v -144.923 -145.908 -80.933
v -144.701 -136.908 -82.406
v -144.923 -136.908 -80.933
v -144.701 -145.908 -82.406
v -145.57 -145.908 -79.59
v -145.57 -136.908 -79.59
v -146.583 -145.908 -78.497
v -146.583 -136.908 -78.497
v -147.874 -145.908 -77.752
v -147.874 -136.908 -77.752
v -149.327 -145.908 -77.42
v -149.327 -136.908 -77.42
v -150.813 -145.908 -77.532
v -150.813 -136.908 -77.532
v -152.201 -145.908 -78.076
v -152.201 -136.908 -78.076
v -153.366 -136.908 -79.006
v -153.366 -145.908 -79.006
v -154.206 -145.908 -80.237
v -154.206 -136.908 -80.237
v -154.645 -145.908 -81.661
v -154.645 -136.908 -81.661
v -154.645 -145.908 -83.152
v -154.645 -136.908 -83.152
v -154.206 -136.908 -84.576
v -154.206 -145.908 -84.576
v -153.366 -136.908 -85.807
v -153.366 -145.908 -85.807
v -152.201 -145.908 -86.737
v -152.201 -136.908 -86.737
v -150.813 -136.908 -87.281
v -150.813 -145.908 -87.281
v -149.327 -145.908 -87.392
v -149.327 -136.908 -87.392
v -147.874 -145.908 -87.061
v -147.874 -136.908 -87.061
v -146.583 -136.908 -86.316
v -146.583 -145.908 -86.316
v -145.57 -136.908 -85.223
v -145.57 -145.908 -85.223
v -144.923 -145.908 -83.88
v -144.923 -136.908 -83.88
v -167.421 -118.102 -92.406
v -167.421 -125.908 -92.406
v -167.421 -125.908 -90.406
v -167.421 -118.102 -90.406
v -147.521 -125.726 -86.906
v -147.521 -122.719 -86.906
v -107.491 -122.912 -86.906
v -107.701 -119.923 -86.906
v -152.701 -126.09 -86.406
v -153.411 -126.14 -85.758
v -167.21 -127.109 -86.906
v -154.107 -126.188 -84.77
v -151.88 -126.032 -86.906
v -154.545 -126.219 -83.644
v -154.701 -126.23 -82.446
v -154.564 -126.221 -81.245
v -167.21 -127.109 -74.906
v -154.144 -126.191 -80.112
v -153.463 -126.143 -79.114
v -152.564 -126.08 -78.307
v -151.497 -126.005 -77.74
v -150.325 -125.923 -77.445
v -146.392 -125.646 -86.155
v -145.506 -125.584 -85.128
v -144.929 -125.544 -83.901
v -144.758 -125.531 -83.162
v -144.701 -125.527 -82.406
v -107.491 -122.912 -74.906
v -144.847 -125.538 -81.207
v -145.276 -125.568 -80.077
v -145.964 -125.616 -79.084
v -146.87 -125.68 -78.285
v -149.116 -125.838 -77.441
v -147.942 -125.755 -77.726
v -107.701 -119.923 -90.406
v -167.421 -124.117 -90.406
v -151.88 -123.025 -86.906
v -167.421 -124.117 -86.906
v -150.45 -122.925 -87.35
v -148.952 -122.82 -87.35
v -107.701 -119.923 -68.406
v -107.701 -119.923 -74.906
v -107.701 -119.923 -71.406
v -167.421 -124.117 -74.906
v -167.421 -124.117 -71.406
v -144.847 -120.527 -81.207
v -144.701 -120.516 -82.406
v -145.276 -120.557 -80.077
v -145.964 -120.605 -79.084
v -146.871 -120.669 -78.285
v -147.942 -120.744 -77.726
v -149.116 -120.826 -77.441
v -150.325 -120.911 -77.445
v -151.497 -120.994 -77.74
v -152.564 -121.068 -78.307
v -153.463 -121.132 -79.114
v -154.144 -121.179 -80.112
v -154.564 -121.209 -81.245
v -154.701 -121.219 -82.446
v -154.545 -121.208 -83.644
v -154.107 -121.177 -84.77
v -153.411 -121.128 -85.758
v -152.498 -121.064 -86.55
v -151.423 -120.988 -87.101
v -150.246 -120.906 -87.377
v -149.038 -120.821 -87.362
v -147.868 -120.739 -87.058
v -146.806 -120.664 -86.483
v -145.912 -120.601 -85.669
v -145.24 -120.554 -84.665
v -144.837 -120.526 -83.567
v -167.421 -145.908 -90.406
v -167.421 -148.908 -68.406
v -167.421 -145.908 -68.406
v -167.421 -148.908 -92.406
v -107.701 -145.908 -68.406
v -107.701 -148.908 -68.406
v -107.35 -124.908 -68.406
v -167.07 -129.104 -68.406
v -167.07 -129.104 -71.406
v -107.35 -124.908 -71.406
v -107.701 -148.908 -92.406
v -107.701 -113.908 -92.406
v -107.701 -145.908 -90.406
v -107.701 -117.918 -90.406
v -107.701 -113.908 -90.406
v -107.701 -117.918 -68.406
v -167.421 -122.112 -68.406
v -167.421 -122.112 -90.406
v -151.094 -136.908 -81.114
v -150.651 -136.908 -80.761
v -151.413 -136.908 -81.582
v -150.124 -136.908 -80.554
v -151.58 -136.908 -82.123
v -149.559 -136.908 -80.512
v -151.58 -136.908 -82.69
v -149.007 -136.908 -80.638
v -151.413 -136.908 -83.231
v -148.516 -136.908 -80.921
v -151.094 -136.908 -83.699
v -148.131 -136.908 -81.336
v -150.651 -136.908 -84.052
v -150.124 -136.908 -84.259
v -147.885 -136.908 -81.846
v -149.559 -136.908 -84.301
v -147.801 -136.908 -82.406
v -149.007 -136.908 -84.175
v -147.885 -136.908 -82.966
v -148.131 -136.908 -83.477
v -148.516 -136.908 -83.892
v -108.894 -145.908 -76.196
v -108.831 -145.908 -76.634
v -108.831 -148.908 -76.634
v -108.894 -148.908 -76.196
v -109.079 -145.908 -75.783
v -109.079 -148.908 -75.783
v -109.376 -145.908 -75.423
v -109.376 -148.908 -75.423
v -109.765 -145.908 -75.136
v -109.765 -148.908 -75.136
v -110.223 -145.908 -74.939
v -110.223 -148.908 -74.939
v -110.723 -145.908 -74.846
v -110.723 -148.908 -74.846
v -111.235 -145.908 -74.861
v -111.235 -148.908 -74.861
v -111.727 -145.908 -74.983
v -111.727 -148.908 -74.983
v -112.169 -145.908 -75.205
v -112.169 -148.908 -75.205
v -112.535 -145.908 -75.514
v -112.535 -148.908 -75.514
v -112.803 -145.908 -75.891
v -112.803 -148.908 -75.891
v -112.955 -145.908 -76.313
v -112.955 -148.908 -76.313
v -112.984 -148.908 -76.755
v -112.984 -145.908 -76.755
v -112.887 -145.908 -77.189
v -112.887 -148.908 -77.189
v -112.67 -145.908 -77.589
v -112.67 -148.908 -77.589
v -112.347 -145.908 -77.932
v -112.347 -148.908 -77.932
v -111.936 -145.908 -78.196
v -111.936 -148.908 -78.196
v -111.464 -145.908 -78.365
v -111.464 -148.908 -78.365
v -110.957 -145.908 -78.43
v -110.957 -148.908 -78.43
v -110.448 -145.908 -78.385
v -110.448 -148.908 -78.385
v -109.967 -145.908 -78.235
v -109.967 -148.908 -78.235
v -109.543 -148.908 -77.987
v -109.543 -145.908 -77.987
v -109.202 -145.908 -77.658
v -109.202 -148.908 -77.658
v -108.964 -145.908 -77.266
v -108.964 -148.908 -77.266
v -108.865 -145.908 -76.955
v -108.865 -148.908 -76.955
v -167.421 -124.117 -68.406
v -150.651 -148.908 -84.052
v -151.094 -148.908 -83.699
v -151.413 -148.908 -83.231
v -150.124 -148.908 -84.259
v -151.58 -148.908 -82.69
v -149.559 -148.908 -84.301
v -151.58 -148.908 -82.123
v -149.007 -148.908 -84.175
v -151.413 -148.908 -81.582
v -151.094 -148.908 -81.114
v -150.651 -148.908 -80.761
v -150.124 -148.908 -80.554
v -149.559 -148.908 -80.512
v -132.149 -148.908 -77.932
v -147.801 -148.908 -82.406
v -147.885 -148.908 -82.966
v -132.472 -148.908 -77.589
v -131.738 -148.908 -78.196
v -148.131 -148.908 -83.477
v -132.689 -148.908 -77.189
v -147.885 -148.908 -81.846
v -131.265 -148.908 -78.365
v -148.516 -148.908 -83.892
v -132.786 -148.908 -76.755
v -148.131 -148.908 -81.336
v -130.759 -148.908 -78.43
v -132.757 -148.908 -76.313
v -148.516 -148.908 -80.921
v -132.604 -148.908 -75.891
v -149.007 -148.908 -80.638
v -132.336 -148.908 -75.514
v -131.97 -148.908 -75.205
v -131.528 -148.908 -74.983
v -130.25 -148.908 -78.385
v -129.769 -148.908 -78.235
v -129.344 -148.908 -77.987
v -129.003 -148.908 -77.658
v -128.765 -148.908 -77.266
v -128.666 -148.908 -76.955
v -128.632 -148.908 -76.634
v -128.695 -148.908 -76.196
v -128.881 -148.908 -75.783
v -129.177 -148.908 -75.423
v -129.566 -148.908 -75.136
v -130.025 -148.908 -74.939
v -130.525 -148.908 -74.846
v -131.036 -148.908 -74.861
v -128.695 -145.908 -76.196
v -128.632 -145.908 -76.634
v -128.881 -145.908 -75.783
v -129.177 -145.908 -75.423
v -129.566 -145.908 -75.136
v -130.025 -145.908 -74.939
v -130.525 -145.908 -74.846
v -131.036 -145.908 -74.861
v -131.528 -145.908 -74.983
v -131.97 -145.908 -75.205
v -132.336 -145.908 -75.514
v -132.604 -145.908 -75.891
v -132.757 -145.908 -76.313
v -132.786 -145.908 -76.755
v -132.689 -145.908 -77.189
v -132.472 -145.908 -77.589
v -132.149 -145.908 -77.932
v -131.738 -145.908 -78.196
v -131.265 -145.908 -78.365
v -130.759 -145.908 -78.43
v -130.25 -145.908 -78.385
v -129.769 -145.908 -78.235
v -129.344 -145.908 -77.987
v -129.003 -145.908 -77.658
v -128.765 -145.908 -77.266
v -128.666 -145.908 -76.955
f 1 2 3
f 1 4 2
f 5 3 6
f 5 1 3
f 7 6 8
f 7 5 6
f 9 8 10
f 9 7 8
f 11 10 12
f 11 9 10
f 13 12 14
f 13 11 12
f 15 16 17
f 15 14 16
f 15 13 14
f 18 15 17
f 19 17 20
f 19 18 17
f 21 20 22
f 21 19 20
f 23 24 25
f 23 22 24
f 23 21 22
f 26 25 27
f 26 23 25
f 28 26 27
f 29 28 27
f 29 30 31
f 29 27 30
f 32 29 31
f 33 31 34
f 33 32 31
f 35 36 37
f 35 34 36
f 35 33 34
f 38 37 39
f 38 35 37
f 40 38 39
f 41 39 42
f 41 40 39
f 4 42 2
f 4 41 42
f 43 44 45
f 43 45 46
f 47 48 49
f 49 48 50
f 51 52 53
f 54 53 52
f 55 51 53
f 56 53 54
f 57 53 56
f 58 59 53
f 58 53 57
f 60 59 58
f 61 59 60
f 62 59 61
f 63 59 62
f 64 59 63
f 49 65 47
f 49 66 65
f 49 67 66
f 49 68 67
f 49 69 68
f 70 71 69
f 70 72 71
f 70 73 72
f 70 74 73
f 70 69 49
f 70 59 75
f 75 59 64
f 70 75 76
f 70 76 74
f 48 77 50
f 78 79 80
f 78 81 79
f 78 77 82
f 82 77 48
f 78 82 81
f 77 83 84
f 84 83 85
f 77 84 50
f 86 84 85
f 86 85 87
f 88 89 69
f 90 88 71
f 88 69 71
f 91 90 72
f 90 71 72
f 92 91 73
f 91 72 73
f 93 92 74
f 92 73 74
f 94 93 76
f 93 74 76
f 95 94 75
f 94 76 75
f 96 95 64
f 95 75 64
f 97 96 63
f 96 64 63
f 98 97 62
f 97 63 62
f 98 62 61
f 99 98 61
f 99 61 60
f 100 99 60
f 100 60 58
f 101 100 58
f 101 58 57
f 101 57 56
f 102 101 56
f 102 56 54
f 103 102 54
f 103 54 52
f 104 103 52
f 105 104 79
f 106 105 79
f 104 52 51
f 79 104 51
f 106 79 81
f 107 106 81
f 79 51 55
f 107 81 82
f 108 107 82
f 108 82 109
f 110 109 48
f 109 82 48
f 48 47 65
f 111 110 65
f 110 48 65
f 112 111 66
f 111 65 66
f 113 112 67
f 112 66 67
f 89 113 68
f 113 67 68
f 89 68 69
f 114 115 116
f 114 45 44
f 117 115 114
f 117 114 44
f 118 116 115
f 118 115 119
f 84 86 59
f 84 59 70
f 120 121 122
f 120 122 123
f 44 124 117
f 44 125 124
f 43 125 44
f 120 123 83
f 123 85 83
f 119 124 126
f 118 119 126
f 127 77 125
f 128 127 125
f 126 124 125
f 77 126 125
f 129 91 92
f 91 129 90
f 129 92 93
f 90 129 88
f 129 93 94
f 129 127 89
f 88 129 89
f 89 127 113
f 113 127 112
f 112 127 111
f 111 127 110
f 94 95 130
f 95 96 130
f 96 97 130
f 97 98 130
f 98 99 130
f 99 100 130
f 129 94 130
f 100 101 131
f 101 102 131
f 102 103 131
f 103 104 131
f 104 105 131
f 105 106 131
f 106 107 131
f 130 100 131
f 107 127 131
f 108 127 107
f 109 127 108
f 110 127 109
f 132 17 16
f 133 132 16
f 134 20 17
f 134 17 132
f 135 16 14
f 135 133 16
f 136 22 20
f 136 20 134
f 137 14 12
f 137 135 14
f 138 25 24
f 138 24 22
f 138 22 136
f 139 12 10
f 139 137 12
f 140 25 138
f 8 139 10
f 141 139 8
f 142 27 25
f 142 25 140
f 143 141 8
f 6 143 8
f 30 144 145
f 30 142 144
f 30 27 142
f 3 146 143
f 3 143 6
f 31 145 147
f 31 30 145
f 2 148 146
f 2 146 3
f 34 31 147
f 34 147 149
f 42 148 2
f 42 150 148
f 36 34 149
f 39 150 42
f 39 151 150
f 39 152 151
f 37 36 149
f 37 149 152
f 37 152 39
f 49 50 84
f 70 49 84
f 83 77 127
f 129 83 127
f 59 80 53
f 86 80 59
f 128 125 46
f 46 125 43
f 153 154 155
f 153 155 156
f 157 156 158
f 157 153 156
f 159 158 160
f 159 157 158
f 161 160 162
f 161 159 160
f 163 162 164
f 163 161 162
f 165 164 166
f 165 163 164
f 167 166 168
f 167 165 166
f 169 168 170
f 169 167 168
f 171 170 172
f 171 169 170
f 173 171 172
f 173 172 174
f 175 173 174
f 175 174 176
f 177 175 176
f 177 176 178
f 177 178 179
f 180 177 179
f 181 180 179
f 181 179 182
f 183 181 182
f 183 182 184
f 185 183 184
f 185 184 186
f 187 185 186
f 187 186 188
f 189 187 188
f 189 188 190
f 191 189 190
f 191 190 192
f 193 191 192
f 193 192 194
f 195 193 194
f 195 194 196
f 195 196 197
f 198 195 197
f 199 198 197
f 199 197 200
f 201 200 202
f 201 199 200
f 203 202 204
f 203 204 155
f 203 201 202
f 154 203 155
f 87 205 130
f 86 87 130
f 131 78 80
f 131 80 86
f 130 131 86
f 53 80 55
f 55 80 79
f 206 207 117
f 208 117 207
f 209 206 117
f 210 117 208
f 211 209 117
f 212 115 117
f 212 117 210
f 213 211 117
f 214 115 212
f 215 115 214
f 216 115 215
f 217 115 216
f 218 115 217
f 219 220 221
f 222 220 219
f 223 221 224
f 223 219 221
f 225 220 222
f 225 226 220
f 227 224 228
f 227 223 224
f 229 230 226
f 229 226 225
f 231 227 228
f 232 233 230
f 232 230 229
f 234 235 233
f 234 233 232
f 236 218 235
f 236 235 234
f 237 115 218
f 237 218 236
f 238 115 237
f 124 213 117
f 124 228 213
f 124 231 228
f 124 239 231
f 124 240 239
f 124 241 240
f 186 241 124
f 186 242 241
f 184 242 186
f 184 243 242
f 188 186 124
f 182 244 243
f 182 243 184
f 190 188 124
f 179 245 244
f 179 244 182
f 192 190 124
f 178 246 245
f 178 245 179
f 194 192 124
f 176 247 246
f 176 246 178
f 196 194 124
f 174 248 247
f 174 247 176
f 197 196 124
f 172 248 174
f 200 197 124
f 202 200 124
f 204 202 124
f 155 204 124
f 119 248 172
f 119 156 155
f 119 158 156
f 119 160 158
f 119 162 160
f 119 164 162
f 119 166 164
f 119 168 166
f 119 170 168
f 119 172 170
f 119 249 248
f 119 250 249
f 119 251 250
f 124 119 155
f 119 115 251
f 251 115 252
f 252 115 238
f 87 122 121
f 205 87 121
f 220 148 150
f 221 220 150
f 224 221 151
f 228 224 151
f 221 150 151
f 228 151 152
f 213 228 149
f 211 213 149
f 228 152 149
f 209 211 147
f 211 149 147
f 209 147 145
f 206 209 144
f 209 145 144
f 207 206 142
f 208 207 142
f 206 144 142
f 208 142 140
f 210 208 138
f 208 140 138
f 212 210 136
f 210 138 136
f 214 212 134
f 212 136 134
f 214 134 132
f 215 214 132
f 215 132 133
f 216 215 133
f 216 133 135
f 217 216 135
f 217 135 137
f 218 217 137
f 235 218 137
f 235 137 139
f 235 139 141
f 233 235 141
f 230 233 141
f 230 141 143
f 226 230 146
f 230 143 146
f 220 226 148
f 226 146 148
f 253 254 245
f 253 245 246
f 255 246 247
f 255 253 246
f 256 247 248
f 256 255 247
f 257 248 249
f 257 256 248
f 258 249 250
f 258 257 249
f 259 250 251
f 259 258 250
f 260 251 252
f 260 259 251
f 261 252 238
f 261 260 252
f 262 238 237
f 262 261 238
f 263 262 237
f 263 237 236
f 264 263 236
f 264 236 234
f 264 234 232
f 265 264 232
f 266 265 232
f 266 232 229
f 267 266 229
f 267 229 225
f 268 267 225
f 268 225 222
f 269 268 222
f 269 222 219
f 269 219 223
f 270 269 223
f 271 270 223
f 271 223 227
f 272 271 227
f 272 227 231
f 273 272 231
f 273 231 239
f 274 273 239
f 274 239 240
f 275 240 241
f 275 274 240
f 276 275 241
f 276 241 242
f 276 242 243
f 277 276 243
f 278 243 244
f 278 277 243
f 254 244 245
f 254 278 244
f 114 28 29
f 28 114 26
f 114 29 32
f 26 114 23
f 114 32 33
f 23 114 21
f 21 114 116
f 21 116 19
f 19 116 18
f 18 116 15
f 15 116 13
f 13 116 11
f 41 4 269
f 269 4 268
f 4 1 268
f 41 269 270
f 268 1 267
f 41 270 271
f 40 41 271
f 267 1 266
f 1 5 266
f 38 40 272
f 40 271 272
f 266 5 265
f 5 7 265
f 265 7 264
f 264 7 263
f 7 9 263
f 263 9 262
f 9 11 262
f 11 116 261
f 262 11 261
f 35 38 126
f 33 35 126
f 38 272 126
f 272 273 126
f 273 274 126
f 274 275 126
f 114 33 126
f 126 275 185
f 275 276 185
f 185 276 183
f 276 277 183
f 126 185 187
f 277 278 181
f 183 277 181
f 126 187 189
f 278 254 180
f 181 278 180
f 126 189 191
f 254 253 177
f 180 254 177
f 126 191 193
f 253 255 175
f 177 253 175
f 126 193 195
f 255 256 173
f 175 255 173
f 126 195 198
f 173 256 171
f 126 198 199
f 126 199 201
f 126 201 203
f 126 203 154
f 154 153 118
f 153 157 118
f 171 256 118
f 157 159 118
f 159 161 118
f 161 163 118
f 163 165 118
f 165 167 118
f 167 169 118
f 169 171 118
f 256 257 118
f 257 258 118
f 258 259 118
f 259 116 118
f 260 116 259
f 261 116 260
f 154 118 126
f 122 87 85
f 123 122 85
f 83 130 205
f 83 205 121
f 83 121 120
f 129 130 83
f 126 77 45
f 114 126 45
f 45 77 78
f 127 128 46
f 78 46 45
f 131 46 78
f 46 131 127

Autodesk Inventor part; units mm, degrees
ref_plane "YZ Plane" through (0, 0, 0) normal (1, 0, 0) x (0, 1, 0)
ref_plane "XZ Plane" through (0, 0, 0) normal (0, 1, 0) x (-1, 0, 0)
ref_plane "XY Plane" through (0, 0, 0) normal (0, 0, 1) x (1, 0, 0)
ref_plane "작업 평면1" through (-108.7402, -145.9081, -64.7043) normal (0, -1, 0) x (1, 0, 0)
sketch "스케치1" plane through (-108.7402, -145.9081, -64.7043) normal (0, -1, 0) x (1, 0, 0)
  ellipse E0 centre (-21.9712, -11.93) end of major axis (-19.8923, -11.93) minor radius 1.7957 projected
  ellipse E1 centre (-2.1698, -11.93) end of major axis (-0.091, -11.93) minor radius 1.7957 projected
  line L0 (-25.1804, -13.5798) -> (-25.1804, 0) projected
  ellipse E2 centre (0, 0) end of major axis (1.0394, 0) minor radius 0.8978 (1.0394, 0) -> (0, 0.8978) ccw projected
  line L1 (1.0394, 0) -> (1.0394, -13.5798) projected
  ellipse E3 centre (-0.2599, -13.5798) end of major axis (1.0394, -13.5798) minor radius 1.1223 (-0.2599, -14.7021) -> (1.0394, -13.5798) ccw projected
  line L2 (-0.2599, -14.7021) -> (-23.8811, -14.7021) projected
  ellipse E4 centre (-23.8811, -13.5798) end of major axis (-22.5818, -13.5798) minor radius 1.1223 (-25.1804, -13.5798) -> (-23.8811, -14.7021) ccw projected
  line L3 (-25.1804, -13.5798) -> (-25.1804, 0) projected
  ellipse E5 centre (-24.141, 0) end of major axis (-25.1804, 0) minor radius 0.8978 (-24.141, 0.8978) -> (-25.1804, 0) ccw projected
  line L4 (-24.141, 0.8978) -> (0, 0.8978) projected
  ellipse E6 centre (-21.9712, -11.93) end of major axis (-19.3726, -11.93) minor radius 2.2446 projected
  ellipse E7 centre (-2.1698, -11.93) end of major axis (0.4288, -11.93) minor radius 2.2446 projected
  ellipse E8 centre (-23.6213, -0.5275) end of major axis (-22.4194, -0.5275) minor radius 1.0381 projected
  ellipse E9 centre (-20.3211, -0.5275) end of major axis (-19.1192, -0.5275) minor radius 1.0381 projected
  ellipse E10 centre (-17.0208, -0.5275) end of major axis (-15.819, -0.5275) minor radius 1.0381 projected
  ellipse E11 centre (-13.7206, -0.5275) end of major axis (-12.5188, -0.5275) minor radius 1.0381 projected
  ellipse E12 centre (-10.4204, -0.5275) end of major axis (-9.2185, -0.5275) minor radius 1.0381 projected
  ellipse E13 centre (-7.1202, -0.5275) end of major axis (-5.9183, -0.5275) minor radius 1.0381 projected
  ellipse E14 centre (-3.8199, -0.5275) end of major axis (-2.6181, -0.5275) minor radius 1.0381 projected
  ellipse E15 centre (-0.5197, -0.5275) end of major axis (0.6821, -0.5275) minor radius 1.0381 projected
  line L5 (-25.1804, -3.7021) -> (1.0394, -3.7021)
  line L6 (1.0394, -27.7021) -> (-58.6804, -27.7021)
  line L7 (-58.6804, -27.7021) -> (-58.6804, -3.7021)
  line L8 (-58.6804, -3.7021) -> (1.0394, -3.7021)
  line L9 (1.0394, -3.7021) -> (1.0394, -27.7021)
  point P0 (108.7402, 64.7043)
  point P1 (-25.1804, -3.7021)
  point P2 (-25.1804, -3.7021)
  point P3 (1.0394, -13.5798)
  dimension "d0" = 11
  dimension "d3" = 33.5
  dimension "d4" = 13
extrude "돌출1" add sketch "스케치1" along normal blind 3 contours E4 L2 E3 L9 L6 L7 L8 L0 | L0 L5 L1 E3 L2 E4 | E6 | E7
sketch "스케치2" plane through (-108.7402, -145.9081, -64.7043) normal (0, 1, 0) x (1, 0, 0)
  line L0 (1.0394, 27.7021) -> (1.0394, 3.7021) projected
  line L1 (-58.6804, 27.7021) -> (1.0394, 27.7021) projected
  line L2 (-58.6804, 3.7021) -> (-58.6804, 27.7021) projected
  line L3 (1.0394, 27.7021) -> (-58.6804, 27.7021)
  line L4 (-58.6804, 27.7021) -> (-58.6804, 25.7021)
  line L5 (-58.6804, 25.7021) -> (1.0394, 25.7021)
  line L6 (1.0394, 25.7021) -> (1.0394, 27.7021)
  point P0 (108.7402, -64.7043)
  point P1 (1.0394, 25.7021)
  dimension "d5" = 2
extrude "돌출2" add sketch "스케치2" along normal blind 20
sketch "스케치4" plane through (-107.7008, -148.9081, -92.4064) normal (0, 0, -1) x (-1, 0, 0)
  line L0 (0, 23) -> (59.7199, 23) projected
  line L1 (0, 23) -> (0, 35)
  line L2 (0, 35) -> (42.7199, 35) construction
  line L3 (42.7199, 35) -> (42.7199, 32) construction
  line L4 (0, 35) -> (59.7199, 30.8062)
  line L5 (59.7199, 23) -> (59.7199, 40.663)
  point P0 (-107.7008, 148.9081)
  dimension "d11" = 42.7199
  dimension "d12" = 12
  dimension "d13" = 3
extrude "돌출4" add sketch "스케치4" against normal blind 2
sketch "스케치5" plane through (-108.7402, -145.9081, -64.7043) normal (0, 1, 0) x (1, 0, 0)
  line L0 (1.0394, 3.7021) -> (-58.6804, 3.7021) projected
  line L1 (1.0394, 25.7021) -> (1.0394, 3.7021) projected
  circle A0 centre (-40.9606, 17.7021) radius 5
  point P0 (108.7402, -64.7043)
  dimension "d16" = 10
  dimension "d17" = 14
  dimension "d18" = 42
extrude "돌출5" add sketch "스케치5" along normal blind 9
sketch "스케치6" plane through (-167.4206, -145.9081, -90.4064) normal (0, 0, 1) x (1, 0, 0)
  line L0 (59.7199, 0) -> (59.7199, 32) projected
  line L1 (59.7199, 32) -> (0, 27.8062) projected
  line L2 (0, 0) -> (0, 27.8062) projected
  line L3 (59.7199, 25.9852) -> (0, 21.7914)
  line L4 (59.7199, 27.9901) -> (0, 23.7963)
  line L5 (0, 23.7963) -> (0, 21.7914)
  line L6 (59.7199, 27.9901) -> (59.7199, 25.9852)
  point P0 (167.4206, 145.9081)
  point P1 (0, 23.7963)
  dimension "d21" = 6
  dimension "d22" = 2
extrude "돌출6" add sketch "스케치6" along normal up to surface (22 mm away) contours L3 L2 L4 L0
sketch "스케치11" plane through (-167.4206, -124.1167, -90.4064) normal (0.0701, -0.9975, 0) x (0.9975, 0.0701, 0)
  line L0 (59.8669, 22) -> (0, 22) projected
  line L1 (0, 0) -> (0, 22) projected
  line L2 (59.8669, 0) -> (0, 0) projected
  line L3 (59.8669, 0) -> (59.8669, 22) projected
  line L4 (0, 15.5) -> (59.8669, 15.5)
  line L5 (57.8365, 22) -> (-1.7367, 22) projected
  line L6 (0, 3.5) -> (59.8669, 3.5)
  point P0 (175.704, 90.4064)
  dimension "d36" = 6.5
  dimension "d39" = 3.5
extrude "돌출11" add sketch "스케치11" along normal blind 3 contours L3 L6 L1 L4
sketch "스케치7" plane through (-149.7008, -136.9081, -82.4064) normal (0, 1, 0) x (1, 0, 0)
  circle A0 centre (0, 0) radius 5 projected
  circle A1 centre (0, 0) radius 1.9
  point P0 (149.7008, -82.4064)
  dimension "d25" = 3.8
extrude "돌출7" cut sketch "스케치7" against normal through all contours A1
sketch "스케치8" plane through (-149.7008, -136.9081, -82.4064) normal (0, 1, 0) x (1, 0, 0)
  circle A0 centre (0, 0) radius 5 projected
  point P0 (149.7008, -82.4064)
extrude "돌출8" cut sketch "스케치8" along normal blind 16.75
sketch "스케치9" plane through (-167.4206, -124.1167, -90.4064) normal (0.0701, -0.9975, 0) x (0.9975, 0.0701, 0)
  line L0 (59.8669, 22) -> (0, 22) projected
  line L1 (0, 0) -> (0, 22) projected
  line L2 (59.8669, 0) -> (59.8669, 22) projected
  line L3 (0, 19) -> (59.8669, 19)
  point P0 (175.704, 90.4064)
  dimension "d30" = 3
extrude "돌출9" add sketch "스케치9" along normal blind 5
properties part number "IMU_base" material "고무, 검은색"
